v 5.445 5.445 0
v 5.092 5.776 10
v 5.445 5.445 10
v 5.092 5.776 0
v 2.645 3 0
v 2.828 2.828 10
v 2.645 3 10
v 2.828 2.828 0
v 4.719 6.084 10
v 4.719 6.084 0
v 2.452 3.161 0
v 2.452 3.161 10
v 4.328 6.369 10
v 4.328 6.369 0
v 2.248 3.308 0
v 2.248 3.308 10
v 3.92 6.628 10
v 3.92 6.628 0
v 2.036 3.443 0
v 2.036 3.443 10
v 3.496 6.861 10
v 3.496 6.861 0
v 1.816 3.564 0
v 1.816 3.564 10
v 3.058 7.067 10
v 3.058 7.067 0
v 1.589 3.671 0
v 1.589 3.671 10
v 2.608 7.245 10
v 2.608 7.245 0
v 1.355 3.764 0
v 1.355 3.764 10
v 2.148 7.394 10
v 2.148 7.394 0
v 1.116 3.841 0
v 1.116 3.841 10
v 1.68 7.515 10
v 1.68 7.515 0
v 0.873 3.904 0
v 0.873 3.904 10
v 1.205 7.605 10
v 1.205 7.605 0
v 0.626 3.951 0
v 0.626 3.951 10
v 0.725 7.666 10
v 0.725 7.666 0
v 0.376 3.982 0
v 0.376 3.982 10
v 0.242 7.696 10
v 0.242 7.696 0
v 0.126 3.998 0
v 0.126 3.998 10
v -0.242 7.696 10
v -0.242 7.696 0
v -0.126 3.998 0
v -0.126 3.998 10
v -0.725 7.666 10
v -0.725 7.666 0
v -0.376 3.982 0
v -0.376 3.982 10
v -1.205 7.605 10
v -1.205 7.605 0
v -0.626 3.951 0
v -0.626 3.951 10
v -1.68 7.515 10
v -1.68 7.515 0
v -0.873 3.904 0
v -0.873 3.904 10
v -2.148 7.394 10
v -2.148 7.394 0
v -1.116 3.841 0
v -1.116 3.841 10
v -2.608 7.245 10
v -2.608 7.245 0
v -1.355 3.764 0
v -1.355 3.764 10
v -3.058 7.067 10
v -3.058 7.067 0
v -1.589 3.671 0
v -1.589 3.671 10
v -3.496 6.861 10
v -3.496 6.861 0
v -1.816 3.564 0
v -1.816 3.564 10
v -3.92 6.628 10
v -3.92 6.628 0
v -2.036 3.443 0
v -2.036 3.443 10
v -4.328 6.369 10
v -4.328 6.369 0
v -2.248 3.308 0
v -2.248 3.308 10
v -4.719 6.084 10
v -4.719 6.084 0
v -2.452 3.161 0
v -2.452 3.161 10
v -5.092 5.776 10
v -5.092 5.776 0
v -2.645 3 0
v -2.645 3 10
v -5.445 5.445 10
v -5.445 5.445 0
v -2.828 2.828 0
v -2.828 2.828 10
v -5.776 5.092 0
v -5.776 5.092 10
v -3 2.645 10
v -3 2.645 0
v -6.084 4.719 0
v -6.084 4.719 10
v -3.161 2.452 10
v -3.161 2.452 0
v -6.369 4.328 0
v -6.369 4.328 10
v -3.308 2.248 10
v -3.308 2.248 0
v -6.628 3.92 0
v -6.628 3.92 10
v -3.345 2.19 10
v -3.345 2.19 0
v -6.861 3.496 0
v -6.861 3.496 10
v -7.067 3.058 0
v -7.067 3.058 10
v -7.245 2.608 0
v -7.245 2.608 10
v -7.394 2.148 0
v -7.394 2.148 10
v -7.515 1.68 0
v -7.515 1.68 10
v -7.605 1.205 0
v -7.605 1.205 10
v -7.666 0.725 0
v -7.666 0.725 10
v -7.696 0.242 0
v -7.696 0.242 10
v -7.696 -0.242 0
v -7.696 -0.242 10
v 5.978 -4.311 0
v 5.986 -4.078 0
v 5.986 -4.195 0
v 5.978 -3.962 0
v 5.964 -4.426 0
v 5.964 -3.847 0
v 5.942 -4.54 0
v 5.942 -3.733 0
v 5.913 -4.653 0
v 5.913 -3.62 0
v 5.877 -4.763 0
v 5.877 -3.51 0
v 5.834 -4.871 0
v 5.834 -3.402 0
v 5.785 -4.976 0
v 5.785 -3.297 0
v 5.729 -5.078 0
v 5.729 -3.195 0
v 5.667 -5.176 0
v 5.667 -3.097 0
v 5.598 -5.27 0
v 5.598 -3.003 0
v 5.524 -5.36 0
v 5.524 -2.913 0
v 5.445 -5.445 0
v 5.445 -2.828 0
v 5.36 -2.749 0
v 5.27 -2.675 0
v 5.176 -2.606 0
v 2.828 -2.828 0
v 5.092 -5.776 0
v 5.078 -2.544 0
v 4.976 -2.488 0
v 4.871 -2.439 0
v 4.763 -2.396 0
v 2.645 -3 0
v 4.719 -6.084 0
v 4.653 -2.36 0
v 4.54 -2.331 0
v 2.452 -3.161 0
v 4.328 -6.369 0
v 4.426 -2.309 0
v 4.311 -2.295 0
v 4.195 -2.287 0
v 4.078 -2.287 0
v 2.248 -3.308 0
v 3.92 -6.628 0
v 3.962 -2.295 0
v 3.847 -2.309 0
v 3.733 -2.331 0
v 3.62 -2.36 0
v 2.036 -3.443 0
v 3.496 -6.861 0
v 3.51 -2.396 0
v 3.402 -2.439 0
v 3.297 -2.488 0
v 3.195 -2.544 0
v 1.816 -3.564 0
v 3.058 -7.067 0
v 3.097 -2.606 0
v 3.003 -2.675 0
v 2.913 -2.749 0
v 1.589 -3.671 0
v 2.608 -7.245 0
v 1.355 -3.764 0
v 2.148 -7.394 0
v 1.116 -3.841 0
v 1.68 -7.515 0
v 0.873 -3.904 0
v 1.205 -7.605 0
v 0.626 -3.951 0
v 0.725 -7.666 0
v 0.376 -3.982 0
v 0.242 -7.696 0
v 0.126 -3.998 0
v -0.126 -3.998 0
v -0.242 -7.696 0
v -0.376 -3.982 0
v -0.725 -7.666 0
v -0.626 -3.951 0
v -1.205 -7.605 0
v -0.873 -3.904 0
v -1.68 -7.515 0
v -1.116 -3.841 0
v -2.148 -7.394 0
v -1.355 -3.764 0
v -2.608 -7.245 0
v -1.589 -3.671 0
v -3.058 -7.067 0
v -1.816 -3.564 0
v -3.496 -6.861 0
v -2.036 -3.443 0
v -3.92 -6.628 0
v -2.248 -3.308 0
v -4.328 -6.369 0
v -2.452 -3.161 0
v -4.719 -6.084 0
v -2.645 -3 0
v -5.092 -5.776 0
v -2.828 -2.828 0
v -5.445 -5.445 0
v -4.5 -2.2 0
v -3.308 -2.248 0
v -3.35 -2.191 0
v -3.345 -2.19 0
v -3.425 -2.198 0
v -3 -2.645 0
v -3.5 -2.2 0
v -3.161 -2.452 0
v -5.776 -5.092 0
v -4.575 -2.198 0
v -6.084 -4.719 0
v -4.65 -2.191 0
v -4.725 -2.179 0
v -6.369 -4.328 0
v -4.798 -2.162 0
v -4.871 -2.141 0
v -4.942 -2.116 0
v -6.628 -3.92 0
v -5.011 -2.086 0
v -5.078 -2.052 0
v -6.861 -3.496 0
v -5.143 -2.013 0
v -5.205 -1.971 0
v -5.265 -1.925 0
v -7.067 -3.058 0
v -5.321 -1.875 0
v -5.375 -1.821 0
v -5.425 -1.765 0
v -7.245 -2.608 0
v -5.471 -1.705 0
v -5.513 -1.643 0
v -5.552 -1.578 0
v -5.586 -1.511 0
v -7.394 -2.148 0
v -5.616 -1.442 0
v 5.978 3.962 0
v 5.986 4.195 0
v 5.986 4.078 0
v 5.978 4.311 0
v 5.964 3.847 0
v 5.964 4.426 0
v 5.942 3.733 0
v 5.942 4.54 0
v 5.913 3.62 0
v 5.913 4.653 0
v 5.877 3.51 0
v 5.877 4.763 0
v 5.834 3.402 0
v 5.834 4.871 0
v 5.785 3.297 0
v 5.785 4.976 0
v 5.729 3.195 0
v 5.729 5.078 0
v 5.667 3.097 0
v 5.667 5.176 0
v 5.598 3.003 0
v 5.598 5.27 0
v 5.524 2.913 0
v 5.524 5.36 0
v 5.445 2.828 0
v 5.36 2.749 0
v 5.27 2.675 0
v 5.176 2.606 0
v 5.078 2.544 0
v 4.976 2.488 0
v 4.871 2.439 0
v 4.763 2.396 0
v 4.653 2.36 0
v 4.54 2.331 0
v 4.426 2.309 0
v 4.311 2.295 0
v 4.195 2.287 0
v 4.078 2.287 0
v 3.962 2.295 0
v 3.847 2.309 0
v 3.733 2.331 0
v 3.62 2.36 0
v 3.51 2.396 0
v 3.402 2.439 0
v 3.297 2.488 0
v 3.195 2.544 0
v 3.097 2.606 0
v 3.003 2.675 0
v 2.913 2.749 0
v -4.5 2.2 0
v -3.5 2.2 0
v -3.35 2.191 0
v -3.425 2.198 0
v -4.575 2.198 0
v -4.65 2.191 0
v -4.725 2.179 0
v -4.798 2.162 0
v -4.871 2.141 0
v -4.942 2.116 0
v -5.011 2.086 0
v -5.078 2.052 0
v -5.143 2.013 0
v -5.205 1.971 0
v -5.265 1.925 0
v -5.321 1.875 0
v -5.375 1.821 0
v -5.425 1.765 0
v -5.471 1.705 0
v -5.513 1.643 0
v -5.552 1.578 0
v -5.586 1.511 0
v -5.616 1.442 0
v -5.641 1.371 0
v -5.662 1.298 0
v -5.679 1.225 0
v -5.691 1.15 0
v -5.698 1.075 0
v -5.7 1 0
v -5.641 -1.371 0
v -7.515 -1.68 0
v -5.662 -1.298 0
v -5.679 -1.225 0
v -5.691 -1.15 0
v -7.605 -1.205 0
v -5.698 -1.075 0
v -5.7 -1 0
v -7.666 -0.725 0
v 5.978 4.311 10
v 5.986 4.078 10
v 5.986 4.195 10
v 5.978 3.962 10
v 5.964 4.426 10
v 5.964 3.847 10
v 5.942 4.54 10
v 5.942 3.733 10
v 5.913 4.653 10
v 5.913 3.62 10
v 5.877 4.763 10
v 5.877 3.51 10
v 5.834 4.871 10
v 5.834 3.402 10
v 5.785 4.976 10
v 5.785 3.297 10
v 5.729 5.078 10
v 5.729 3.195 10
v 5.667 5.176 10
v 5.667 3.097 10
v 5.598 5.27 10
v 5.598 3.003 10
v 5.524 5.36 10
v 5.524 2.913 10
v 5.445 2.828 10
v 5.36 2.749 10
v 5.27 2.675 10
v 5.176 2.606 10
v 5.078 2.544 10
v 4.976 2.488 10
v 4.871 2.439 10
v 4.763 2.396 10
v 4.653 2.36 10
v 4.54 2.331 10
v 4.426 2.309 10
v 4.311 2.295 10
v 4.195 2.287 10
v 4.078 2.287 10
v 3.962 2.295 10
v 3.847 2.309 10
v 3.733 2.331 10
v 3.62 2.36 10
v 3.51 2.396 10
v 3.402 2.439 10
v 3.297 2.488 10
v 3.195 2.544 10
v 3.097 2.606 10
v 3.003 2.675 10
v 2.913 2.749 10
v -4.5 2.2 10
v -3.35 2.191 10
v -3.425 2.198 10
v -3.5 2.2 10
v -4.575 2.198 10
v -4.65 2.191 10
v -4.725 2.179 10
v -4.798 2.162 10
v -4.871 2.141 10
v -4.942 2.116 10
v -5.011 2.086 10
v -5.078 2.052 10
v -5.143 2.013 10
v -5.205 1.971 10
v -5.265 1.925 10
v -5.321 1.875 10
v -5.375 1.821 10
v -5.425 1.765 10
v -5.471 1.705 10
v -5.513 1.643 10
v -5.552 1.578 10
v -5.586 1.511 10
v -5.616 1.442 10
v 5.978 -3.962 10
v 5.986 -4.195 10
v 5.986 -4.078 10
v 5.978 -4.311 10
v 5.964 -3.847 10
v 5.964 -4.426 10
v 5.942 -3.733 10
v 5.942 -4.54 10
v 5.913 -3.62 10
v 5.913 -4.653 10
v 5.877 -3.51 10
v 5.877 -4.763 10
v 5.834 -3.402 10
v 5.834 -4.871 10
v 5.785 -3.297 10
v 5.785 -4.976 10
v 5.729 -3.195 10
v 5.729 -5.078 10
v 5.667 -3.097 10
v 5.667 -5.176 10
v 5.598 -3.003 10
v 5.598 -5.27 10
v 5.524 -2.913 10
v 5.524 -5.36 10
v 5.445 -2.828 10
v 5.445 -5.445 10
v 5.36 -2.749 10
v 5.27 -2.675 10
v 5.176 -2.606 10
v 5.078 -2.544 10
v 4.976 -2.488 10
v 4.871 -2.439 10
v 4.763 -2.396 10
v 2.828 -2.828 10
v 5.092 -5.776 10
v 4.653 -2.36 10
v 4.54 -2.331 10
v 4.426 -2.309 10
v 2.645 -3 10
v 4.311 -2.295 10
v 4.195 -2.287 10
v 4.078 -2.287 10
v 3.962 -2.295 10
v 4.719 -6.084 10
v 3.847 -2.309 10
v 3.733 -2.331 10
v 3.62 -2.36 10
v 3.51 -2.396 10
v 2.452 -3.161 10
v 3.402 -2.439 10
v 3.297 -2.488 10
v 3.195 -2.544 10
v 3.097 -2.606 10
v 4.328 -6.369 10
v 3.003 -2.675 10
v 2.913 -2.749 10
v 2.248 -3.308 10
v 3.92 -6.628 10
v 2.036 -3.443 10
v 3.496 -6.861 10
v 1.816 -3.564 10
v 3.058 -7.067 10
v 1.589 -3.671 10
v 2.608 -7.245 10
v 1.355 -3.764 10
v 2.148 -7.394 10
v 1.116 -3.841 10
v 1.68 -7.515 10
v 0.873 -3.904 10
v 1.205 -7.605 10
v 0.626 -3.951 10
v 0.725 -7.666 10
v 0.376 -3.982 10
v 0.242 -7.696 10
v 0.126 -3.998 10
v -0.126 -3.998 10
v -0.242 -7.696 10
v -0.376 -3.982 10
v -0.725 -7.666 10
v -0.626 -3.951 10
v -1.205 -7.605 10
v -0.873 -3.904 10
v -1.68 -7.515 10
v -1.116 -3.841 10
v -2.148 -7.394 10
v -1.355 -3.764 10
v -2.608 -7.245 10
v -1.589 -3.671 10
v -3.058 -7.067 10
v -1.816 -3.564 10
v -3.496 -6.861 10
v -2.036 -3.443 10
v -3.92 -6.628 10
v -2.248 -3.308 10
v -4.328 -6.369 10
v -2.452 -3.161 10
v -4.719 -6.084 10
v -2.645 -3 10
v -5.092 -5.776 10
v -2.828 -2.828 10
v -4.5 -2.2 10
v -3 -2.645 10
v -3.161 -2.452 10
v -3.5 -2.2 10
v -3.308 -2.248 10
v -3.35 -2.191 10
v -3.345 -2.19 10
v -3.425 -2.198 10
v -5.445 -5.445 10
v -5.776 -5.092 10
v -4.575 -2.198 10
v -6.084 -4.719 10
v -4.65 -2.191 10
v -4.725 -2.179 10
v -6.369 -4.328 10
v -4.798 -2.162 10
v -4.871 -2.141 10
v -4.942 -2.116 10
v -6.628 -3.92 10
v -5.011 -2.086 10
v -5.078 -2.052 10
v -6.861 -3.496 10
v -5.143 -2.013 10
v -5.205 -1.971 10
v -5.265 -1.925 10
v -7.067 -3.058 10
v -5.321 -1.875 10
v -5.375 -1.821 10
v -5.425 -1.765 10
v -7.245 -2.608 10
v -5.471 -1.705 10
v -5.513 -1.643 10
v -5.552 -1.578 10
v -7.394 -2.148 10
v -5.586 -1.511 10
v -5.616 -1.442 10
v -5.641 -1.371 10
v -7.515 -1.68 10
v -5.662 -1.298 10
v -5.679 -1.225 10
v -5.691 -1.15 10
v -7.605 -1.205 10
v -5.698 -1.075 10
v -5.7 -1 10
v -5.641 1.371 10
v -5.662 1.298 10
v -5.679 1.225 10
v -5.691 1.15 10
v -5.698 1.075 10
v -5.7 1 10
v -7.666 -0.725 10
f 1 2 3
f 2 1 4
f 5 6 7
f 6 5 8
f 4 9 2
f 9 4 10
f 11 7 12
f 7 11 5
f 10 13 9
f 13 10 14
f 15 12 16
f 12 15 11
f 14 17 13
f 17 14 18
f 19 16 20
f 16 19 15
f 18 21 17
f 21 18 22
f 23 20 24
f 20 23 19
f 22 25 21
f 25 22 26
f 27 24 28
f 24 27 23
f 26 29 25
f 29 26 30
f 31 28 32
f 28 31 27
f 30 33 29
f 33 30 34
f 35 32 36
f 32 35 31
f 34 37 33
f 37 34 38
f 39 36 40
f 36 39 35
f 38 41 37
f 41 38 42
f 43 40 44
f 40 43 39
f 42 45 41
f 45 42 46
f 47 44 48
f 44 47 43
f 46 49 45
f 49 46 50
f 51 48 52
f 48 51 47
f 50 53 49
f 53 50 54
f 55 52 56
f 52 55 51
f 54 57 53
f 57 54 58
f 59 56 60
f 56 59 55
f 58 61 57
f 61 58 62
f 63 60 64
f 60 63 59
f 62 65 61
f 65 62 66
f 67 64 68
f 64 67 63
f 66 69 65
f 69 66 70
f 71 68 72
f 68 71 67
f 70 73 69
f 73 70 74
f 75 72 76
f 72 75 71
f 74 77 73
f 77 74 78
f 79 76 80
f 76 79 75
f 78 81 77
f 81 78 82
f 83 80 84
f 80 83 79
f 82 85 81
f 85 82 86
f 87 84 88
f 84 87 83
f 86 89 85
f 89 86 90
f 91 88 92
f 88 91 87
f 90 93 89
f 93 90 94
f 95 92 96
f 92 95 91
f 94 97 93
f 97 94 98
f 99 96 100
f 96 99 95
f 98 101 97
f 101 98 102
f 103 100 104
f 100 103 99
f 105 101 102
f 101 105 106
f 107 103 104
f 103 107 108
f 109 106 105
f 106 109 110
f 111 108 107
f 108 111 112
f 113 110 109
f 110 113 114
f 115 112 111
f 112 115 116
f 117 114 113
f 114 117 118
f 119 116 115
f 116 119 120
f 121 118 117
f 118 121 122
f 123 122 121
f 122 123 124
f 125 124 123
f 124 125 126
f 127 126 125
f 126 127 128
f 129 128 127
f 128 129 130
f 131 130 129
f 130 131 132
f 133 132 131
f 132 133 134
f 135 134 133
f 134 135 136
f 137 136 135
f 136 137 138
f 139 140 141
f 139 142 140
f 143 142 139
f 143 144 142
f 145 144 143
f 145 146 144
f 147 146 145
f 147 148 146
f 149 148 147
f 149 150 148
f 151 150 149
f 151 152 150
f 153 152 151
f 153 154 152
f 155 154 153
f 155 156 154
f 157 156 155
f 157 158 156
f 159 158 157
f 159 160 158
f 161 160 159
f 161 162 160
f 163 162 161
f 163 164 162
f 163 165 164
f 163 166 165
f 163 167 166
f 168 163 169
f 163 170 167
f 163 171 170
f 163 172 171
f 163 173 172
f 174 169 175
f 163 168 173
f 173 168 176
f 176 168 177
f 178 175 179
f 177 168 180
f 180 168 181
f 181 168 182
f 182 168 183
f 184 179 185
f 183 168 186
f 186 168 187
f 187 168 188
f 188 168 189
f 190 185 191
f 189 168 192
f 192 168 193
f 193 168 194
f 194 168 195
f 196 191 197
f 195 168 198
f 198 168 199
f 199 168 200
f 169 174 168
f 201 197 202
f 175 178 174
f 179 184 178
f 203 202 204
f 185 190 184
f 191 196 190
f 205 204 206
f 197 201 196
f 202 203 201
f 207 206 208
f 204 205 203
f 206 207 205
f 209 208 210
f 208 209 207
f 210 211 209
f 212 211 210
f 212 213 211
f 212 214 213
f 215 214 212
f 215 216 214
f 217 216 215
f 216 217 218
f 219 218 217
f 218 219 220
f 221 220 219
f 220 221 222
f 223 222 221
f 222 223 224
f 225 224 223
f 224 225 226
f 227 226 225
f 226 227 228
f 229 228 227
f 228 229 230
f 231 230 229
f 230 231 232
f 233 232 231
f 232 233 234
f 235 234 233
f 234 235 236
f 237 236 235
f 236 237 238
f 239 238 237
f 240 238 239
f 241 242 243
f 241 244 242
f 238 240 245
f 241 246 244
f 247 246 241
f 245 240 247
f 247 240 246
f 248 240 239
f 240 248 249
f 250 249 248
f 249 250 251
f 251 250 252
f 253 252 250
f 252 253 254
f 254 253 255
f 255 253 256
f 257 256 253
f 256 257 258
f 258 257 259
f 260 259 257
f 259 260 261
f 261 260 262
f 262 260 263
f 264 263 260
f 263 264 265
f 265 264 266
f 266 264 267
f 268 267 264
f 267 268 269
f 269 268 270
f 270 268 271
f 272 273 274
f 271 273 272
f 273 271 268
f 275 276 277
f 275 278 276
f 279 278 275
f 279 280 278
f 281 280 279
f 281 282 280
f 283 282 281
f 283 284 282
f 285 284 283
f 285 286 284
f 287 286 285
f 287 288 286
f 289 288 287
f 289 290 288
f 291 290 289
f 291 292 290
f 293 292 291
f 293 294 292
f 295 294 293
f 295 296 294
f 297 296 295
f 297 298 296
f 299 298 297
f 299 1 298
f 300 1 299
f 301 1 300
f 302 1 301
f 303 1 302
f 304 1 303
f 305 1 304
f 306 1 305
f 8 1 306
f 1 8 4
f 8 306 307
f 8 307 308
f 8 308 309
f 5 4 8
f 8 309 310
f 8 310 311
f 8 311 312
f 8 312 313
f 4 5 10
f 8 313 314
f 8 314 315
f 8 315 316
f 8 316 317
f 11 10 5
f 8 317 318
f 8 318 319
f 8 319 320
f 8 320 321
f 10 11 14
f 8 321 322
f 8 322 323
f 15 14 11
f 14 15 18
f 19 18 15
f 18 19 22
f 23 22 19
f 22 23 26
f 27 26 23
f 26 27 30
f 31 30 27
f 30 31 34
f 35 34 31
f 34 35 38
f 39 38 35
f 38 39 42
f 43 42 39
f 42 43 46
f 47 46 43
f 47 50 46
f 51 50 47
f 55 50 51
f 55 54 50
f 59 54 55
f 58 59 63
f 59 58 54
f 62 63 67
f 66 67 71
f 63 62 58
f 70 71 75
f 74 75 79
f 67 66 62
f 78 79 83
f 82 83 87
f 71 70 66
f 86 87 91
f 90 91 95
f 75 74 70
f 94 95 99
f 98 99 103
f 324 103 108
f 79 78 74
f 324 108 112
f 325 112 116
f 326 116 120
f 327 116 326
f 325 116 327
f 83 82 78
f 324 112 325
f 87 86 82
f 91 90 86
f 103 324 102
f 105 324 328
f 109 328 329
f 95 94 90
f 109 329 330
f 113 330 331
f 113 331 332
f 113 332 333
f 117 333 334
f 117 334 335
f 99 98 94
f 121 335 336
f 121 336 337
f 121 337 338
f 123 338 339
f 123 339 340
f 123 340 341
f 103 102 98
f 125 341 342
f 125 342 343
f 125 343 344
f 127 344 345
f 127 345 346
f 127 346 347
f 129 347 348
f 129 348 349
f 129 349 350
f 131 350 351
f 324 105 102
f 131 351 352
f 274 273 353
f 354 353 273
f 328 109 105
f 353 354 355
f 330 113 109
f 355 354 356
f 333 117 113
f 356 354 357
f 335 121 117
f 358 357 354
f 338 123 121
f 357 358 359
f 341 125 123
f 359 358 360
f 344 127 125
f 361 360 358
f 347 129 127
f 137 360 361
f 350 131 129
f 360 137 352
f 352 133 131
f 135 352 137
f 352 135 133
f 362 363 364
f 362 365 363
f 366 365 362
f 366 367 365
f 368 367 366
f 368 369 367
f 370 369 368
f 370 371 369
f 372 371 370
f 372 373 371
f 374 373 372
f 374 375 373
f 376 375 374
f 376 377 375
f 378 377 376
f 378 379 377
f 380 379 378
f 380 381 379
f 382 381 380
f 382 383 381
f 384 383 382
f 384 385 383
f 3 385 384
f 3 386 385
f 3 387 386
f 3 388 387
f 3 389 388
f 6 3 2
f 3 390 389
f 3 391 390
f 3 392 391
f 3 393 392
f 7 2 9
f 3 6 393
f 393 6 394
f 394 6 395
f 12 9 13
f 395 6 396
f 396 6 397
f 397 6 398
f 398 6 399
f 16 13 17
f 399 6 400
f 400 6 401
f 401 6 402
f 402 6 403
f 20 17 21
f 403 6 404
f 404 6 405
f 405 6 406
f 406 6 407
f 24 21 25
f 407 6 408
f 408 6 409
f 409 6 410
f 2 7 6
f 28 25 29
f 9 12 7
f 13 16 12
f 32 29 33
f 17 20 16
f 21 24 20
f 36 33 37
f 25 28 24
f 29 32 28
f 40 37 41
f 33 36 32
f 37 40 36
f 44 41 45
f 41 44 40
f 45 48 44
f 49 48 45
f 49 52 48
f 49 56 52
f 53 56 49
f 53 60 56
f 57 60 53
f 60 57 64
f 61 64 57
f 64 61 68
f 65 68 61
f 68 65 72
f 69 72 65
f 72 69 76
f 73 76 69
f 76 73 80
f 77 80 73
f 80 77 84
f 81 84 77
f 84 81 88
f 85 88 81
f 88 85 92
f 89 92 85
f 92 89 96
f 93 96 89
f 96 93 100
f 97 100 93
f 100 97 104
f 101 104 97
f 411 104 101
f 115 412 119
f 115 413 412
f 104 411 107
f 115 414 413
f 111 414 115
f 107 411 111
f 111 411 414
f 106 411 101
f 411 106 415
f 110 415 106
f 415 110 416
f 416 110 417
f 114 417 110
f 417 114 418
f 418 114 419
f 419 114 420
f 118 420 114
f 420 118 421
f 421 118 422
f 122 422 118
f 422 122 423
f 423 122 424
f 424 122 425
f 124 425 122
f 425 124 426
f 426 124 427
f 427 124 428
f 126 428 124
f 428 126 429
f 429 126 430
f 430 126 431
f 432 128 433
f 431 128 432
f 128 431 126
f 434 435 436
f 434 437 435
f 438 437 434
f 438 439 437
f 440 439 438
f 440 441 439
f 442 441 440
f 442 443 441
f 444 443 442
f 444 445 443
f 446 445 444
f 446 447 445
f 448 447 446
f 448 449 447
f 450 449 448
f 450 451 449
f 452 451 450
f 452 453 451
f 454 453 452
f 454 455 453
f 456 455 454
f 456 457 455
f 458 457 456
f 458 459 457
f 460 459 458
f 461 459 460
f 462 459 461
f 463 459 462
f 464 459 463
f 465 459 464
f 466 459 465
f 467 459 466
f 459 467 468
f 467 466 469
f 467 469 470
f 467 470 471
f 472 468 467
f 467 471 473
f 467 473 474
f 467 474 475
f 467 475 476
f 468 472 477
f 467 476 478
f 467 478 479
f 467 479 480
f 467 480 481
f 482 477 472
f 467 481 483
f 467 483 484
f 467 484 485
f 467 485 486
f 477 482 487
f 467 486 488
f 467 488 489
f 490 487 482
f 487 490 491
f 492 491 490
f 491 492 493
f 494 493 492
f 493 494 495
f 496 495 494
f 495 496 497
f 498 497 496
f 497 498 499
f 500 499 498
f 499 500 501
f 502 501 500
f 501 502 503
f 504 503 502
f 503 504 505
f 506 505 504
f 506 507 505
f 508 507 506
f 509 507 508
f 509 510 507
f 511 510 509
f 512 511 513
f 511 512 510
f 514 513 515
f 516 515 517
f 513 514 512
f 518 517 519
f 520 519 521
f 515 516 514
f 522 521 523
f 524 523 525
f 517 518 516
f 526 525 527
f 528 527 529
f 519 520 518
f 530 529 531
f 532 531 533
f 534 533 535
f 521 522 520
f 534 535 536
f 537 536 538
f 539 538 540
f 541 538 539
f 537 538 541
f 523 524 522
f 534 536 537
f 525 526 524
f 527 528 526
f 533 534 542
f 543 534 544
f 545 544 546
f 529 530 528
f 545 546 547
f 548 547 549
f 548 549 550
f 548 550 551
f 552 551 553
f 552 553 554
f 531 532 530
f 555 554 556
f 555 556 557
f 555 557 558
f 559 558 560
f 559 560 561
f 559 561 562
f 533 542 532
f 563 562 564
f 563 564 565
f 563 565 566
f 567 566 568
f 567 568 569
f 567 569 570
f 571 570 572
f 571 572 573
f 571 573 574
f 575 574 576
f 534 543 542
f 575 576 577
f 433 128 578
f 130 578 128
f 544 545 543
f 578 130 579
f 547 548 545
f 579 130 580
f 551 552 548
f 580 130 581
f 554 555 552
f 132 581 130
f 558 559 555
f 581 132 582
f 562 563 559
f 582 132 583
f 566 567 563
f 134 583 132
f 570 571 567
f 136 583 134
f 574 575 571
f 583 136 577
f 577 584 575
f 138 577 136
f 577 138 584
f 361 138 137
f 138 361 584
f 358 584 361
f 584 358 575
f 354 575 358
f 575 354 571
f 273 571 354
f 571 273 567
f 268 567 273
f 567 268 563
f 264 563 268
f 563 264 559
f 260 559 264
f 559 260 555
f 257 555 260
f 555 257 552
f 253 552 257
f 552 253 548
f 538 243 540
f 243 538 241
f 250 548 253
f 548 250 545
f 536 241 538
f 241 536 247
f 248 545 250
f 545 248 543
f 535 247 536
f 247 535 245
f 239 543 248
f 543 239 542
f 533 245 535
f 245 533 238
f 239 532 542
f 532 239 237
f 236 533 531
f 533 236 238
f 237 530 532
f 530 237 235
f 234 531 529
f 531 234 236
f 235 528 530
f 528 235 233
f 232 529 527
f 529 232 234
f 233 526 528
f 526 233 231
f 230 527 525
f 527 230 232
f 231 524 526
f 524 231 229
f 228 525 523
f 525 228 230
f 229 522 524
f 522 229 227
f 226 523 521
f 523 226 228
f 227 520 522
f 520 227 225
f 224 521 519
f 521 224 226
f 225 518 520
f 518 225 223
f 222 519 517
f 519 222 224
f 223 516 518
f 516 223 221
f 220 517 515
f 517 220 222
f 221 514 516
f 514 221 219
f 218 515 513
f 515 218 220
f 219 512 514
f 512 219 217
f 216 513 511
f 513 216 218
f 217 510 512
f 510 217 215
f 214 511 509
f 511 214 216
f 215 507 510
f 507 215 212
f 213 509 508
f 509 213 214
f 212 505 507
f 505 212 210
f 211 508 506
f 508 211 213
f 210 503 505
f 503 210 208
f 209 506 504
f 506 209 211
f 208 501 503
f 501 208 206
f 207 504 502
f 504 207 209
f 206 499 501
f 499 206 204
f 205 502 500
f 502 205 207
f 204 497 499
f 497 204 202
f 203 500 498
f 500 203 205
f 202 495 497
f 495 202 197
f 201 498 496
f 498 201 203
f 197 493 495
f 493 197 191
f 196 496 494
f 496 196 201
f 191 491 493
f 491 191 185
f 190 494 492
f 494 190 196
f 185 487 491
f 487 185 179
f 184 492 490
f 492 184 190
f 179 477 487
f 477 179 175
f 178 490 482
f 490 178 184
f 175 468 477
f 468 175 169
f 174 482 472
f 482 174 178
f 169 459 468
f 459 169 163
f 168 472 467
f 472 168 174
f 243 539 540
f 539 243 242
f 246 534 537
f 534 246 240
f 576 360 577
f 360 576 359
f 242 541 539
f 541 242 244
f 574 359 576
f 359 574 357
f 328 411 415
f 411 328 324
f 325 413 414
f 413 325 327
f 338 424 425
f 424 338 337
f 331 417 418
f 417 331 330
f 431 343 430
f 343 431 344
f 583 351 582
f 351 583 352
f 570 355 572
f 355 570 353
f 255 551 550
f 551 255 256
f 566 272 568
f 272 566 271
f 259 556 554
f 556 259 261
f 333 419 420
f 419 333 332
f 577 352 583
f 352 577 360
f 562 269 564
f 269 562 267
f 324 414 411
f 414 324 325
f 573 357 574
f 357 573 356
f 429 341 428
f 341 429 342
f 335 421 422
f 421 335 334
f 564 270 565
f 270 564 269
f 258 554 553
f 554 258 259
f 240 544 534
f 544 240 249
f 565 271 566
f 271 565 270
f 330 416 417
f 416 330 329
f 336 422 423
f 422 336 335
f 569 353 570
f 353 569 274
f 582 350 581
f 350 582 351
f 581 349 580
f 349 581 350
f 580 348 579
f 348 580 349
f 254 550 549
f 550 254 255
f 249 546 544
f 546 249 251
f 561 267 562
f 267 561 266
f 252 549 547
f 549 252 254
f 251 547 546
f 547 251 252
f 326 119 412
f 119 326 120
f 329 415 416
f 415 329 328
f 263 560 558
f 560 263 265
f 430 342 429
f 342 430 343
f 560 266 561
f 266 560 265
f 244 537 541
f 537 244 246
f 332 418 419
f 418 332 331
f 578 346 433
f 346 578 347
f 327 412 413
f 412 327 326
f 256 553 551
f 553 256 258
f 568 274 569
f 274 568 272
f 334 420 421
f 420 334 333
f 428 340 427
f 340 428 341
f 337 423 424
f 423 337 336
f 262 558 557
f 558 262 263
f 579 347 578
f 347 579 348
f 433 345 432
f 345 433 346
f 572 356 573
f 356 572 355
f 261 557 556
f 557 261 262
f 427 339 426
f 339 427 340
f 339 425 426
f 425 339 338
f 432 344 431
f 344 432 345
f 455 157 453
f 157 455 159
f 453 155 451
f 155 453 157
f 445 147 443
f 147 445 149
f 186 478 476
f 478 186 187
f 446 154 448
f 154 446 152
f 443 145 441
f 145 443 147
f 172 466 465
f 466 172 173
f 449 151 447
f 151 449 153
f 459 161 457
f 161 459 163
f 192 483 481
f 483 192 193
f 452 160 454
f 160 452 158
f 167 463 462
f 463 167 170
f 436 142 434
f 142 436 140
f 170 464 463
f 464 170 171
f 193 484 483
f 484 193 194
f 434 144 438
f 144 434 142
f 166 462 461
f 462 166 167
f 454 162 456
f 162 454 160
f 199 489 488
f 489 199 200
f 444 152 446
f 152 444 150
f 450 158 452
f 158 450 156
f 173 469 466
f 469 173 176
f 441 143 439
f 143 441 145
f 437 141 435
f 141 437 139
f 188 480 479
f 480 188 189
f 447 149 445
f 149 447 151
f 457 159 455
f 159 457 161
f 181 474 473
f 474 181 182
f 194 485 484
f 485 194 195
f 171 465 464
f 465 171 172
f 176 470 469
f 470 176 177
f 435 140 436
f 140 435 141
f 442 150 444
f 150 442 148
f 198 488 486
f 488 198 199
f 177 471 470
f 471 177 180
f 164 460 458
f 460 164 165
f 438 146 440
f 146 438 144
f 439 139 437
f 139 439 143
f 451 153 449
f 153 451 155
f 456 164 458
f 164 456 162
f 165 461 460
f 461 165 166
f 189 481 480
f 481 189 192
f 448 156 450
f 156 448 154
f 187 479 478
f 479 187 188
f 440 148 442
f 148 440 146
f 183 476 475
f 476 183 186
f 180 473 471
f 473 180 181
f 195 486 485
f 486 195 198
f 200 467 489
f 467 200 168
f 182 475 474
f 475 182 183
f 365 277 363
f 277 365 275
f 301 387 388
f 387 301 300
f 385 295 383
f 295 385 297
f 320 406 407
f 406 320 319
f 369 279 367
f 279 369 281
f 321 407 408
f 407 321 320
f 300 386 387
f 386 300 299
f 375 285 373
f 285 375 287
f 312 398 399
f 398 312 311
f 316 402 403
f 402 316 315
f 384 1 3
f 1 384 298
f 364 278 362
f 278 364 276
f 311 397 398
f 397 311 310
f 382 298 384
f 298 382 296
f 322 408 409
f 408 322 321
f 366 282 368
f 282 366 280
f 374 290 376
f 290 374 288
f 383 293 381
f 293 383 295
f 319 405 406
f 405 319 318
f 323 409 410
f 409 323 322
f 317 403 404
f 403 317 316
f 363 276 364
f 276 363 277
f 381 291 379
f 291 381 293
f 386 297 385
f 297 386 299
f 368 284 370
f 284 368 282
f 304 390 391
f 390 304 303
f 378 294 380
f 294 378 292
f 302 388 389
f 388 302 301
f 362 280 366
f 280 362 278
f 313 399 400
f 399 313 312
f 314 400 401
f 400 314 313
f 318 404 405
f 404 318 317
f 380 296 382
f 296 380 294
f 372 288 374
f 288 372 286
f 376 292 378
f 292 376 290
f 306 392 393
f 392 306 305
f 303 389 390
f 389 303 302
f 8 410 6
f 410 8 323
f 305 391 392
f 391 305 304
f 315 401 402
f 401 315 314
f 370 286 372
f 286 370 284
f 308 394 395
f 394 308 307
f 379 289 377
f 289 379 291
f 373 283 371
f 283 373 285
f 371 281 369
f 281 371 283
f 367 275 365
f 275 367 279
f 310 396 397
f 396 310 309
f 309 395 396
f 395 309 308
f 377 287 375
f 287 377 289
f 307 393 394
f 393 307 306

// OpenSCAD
rodDia=8;
cableDims=[1.5,3];
spcng=0.2;
rad=1;
clampHght=10;
minWallThck=2;

fudge=0.1;

wallThck=minWallThck+cableDims.x+spcng;

$fn=100;


difference(){
  rotate((360-270)/2) rotate_extrude(angle=270) translate([rodDia/2,0]) square([wallThck,clampHght]);
  translate([-rodDia/2,0,clampHght/2]) linear_extrude(clampHght+fudge,center=true) offset(spcng+rad) 
    square([(cableDims.x-rad)*2,cableDims.y-rad],true);
}

for (i=[-1,1])
  rotate(i*(360-270)/2) translate([(rodDia+wallThck)/2,0,0]) cylinder(d=wallThck,h=clampHght);
